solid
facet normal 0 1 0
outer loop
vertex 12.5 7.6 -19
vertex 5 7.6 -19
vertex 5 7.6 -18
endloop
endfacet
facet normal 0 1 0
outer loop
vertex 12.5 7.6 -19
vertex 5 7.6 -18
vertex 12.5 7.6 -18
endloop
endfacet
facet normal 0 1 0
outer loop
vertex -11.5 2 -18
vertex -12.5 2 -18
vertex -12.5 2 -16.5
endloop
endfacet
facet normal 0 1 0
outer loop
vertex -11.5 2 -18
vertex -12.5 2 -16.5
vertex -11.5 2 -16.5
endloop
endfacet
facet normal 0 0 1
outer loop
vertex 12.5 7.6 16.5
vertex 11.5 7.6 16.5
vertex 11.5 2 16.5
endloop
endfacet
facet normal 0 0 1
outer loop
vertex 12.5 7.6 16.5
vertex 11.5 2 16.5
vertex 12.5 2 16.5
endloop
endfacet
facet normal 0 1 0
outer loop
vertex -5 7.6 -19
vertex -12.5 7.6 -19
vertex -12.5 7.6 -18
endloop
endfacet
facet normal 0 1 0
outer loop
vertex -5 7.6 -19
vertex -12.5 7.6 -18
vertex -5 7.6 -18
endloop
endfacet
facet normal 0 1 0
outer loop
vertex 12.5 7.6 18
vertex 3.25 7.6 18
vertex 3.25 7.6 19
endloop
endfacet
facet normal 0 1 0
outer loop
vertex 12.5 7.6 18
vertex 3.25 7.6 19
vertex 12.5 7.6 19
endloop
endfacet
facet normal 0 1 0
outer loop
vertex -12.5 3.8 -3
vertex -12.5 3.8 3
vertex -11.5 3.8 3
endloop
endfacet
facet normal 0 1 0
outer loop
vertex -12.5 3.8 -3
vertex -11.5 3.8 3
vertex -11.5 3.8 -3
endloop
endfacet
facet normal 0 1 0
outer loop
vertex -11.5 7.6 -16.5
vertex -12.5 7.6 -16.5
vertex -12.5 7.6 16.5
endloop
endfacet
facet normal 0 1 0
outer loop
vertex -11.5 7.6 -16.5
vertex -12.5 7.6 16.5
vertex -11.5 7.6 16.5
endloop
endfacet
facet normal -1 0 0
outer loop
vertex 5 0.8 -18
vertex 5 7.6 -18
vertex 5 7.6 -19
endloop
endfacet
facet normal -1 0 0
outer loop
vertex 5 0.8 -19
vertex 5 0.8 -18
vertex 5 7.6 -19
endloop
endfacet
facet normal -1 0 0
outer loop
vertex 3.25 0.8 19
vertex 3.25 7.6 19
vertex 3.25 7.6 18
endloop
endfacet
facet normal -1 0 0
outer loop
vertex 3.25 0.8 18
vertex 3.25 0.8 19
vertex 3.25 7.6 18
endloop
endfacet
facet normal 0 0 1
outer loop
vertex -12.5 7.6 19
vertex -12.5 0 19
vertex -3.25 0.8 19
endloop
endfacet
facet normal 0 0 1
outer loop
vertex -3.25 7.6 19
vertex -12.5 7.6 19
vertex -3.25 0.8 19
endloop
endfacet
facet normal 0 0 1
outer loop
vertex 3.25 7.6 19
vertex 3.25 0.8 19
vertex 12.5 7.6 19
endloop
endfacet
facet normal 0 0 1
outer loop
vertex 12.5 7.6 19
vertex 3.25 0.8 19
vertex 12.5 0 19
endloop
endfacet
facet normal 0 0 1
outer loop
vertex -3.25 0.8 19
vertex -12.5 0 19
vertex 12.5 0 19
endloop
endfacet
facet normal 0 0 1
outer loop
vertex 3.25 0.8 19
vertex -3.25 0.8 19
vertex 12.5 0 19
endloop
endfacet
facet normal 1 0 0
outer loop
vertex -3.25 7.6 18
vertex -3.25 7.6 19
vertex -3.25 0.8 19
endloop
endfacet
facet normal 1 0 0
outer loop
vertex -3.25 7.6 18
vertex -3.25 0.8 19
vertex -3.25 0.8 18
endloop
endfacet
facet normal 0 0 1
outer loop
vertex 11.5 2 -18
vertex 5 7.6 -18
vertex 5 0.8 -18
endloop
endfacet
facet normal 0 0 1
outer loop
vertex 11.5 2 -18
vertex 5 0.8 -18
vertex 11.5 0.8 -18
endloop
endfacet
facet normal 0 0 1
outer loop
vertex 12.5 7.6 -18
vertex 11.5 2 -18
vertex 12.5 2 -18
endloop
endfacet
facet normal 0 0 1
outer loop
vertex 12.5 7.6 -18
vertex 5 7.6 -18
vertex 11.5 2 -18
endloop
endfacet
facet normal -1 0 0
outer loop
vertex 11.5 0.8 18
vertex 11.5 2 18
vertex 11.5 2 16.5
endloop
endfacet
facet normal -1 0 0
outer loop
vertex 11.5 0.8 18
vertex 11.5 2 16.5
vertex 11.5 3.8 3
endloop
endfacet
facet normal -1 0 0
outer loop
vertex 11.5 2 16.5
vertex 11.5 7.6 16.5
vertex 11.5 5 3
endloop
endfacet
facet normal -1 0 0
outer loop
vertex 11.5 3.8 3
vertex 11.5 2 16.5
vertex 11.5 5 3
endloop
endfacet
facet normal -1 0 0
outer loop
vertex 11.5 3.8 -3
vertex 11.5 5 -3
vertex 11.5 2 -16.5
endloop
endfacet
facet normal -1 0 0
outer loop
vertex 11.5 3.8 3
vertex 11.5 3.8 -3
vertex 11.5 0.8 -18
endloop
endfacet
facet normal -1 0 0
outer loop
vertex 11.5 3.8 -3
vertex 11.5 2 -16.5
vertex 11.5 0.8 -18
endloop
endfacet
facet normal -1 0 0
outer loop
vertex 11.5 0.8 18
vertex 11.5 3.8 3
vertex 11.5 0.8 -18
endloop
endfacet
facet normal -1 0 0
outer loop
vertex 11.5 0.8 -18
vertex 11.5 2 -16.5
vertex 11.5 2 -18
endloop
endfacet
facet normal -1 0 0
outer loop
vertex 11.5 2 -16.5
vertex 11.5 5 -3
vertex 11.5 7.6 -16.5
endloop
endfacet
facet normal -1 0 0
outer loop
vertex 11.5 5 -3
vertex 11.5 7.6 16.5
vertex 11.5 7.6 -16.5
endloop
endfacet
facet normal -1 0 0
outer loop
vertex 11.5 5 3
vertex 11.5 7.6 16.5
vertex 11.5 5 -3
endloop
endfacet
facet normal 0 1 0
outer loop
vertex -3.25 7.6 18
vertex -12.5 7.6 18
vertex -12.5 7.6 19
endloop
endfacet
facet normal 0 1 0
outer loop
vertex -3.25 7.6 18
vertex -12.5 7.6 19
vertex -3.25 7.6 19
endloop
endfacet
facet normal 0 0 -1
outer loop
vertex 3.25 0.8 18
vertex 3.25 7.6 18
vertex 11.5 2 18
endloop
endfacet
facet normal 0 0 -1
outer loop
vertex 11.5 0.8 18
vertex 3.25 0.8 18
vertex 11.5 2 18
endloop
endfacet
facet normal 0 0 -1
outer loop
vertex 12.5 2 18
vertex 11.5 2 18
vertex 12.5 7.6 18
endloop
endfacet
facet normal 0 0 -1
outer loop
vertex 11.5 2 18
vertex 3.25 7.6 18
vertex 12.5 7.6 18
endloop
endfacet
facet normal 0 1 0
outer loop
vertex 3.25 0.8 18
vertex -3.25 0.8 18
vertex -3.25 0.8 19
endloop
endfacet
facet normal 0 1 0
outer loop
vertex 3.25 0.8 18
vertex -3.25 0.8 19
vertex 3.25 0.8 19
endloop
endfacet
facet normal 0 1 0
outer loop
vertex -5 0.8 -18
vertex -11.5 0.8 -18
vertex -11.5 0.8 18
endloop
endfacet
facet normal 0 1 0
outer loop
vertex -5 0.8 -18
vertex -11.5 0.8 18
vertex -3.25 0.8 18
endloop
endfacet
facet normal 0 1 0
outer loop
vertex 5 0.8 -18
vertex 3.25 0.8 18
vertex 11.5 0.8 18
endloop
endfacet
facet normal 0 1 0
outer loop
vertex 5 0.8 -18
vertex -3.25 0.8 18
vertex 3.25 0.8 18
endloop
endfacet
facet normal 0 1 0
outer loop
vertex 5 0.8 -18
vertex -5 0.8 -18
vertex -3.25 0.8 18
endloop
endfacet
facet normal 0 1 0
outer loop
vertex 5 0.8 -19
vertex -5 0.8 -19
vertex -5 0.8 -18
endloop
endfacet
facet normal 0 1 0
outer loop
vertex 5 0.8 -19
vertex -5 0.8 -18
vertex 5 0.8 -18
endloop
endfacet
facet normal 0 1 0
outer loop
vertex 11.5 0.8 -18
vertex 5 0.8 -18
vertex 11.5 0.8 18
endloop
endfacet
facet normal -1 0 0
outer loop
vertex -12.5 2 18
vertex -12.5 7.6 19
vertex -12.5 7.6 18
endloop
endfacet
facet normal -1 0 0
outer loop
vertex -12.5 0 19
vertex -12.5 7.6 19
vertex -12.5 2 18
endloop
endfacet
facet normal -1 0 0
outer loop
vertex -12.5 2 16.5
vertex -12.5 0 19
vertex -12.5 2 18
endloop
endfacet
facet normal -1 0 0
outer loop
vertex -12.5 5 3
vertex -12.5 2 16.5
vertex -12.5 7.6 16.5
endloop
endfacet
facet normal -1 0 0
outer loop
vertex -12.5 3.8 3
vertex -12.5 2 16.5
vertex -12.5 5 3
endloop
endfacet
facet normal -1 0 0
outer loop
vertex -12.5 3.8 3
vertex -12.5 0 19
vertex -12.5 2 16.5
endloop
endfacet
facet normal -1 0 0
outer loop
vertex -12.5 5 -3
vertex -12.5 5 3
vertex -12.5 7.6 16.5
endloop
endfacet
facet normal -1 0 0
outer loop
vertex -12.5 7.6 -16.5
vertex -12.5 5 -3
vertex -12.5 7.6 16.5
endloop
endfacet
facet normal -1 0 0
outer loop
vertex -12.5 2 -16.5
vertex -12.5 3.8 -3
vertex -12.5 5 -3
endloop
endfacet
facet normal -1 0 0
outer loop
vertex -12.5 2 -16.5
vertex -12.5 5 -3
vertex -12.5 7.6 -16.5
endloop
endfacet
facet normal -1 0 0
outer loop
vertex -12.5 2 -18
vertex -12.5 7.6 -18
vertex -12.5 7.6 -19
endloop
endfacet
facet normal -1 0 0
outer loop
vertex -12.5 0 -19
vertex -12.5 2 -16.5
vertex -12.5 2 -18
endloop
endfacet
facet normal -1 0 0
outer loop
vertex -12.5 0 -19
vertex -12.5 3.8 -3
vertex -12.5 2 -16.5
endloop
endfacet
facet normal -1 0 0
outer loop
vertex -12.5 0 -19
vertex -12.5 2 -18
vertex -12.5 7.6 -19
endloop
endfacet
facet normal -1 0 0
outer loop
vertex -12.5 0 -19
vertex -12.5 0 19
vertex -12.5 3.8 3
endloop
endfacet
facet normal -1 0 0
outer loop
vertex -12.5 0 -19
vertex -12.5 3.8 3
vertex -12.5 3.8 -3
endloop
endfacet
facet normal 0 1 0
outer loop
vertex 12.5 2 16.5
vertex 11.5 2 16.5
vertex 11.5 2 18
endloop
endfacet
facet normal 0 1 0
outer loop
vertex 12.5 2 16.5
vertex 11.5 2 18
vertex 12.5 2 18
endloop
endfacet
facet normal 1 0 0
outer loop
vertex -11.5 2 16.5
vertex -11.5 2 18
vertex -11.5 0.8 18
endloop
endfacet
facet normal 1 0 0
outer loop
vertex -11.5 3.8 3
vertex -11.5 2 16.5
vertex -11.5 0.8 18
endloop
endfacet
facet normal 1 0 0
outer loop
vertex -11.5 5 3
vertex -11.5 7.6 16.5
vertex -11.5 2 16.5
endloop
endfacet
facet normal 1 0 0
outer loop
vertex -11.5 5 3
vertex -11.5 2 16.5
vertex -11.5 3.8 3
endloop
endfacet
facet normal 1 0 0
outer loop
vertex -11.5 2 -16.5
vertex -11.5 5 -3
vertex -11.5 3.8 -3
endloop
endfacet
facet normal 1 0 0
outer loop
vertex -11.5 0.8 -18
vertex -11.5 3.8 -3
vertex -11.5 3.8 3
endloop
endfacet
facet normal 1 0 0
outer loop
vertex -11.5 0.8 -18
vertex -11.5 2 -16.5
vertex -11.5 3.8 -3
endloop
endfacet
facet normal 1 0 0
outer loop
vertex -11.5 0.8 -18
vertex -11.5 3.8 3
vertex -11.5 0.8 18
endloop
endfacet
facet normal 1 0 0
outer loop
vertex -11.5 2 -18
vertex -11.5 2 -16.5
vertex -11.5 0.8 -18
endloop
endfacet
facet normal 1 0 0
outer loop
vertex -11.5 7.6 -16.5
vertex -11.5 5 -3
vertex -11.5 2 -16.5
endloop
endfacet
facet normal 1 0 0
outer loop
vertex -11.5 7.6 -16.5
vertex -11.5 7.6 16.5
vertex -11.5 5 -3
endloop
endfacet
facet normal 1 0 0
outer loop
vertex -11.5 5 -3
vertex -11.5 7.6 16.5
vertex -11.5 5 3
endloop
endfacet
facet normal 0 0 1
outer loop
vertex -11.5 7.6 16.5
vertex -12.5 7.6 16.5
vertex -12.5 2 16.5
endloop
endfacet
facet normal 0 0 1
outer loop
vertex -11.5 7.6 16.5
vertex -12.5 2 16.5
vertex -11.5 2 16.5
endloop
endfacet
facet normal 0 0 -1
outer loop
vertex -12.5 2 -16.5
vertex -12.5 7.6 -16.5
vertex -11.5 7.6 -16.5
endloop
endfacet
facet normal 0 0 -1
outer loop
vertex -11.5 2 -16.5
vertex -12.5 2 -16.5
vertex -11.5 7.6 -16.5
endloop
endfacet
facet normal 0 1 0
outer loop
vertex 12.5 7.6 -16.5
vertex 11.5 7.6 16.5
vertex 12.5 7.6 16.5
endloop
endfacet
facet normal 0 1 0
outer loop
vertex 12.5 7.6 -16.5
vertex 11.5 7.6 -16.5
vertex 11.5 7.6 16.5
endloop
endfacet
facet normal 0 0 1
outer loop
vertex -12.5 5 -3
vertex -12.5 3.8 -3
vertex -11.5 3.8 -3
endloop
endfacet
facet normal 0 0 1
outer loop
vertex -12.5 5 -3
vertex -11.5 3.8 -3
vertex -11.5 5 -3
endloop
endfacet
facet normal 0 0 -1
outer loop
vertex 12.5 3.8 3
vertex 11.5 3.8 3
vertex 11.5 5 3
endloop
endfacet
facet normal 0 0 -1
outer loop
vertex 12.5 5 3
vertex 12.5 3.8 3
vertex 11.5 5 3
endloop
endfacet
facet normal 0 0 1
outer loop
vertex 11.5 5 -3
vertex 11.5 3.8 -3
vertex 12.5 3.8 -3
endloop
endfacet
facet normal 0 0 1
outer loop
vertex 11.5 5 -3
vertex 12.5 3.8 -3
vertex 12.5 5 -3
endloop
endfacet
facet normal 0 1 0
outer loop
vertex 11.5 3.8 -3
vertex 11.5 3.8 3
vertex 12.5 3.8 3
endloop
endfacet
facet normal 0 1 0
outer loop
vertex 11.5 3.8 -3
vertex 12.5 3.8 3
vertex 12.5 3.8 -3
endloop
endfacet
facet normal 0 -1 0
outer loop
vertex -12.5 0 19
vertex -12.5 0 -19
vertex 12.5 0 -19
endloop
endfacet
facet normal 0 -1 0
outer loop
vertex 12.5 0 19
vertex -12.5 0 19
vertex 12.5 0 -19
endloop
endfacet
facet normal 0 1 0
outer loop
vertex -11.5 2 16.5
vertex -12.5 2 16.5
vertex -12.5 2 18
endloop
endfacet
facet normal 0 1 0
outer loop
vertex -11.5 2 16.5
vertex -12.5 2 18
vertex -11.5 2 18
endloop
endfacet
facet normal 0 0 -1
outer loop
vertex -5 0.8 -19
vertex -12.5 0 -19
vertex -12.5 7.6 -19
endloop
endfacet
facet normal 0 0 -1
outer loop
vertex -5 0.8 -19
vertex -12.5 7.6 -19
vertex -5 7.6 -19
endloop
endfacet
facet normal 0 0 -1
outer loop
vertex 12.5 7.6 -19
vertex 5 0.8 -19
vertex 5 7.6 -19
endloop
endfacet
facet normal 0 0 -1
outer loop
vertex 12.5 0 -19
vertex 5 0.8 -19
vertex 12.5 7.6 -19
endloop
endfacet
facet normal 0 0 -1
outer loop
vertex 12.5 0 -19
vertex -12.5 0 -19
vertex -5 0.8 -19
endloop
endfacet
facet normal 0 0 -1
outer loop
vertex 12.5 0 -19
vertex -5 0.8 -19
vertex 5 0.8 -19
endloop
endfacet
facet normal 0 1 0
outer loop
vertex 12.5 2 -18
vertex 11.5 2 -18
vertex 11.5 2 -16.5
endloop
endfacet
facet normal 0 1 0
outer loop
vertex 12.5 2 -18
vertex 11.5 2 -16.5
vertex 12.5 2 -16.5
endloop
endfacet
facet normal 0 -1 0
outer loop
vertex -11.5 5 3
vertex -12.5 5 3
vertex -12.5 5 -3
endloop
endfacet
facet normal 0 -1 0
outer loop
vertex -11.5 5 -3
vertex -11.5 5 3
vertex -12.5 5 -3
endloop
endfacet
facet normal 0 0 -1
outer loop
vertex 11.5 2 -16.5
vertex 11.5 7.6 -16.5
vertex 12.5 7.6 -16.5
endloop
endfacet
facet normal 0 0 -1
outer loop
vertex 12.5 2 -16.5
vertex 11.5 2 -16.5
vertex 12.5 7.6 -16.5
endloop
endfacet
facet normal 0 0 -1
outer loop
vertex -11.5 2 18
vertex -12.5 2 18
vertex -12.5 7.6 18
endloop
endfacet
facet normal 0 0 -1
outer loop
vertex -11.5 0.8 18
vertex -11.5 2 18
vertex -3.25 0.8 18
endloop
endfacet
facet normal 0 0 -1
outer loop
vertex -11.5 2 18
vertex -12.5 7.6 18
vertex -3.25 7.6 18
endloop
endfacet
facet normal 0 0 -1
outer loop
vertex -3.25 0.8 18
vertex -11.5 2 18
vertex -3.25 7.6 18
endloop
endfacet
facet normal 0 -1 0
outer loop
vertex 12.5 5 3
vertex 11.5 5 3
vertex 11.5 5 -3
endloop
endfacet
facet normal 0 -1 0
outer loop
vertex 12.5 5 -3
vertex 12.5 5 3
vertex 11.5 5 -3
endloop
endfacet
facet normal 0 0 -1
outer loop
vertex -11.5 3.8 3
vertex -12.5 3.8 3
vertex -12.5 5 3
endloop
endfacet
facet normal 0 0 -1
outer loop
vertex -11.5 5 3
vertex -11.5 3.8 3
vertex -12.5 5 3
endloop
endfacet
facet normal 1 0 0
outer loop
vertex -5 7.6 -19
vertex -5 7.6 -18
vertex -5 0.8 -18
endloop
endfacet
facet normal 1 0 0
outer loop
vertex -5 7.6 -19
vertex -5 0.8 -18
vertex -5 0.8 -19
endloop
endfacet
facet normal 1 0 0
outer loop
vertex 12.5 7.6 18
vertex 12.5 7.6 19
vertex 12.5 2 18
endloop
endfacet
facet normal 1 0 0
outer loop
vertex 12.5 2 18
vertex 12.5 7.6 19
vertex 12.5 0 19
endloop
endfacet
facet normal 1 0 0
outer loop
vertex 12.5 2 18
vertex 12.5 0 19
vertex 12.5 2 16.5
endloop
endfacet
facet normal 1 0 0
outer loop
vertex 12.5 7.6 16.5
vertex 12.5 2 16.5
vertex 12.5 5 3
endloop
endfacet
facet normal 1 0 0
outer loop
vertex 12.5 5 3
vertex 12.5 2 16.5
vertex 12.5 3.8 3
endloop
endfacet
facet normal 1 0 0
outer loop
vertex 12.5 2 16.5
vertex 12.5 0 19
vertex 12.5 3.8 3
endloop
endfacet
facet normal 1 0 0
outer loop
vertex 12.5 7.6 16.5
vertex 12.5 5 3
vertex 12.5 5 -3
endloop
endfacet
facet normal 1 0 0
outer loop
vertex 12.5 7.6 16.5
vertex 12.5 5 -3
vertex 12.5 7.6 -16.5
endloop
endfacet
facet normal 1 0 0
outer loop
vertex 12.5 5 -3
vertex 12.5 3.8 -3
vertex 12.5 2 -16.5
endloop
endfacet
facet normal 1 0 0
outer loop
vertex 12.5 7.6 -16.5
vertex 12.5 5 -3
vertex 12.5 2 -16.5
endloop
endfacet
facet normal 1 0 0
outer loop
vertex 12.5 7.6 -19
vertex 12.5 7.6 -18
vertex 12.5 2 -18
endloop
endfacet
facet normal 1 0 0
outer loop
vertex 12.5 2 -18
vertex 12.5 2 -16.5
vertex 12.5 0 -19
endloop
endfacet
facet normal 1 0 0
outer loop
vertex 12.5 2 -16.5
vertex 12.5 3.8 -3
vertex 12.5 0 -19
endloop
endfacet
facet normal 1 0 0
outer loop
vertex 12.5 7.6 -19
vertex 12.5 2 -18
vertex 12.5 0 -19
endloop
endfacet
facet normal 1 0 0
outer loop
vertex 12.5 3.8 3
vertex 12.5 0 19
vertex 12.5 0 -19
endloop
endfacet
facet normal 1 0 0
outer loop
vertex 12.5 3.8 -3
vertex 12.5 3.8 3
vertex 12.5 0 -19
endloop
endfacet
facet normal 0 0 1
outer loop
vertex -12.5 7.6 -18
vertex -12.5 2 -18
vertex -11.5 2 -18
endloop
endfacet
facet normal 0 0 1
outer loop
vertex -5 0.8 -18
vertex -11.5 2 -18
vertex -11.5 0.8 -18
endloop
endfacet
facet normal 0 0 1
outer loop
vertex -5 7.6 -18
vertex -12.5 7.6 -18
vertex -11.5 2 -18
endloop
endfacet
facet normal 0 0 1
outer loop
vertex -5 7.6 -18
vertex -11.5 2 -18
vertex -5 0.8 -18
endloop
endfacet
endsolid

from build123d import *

# Parameters (mm, degrees)
SKETCH1_W               = 25
SKETCH1_H               = 38
BOSS_EXTRUDE1_DEPTH     = 7.6
SKETCH2_W               = 23
SKETCH2_H               = 36
CUT_EXTRUDE1_DEPTH      = 6.8
SKETCH2_3_W             = 1
SKETCH2_3_H             = 1.5
CUT_EXTRUDE2_DEPTH      = 5.6
CUT_EXTRUDE3_DEPTH      = 24.97936613
CUT_EXTRUDE3_DEPTH_BACK = 24.97936613
SKETCH3_W               = 6
SKETCH3_H               = 1.2
SKETCH4_W               = 6.5
SKETCH4_H               = 1
SKETCH4_W_2             = 10
CUT_EXTRUDE4_DEPTH      = 6.8


with BuildPart() as part:
    # Sketch1 → Boss-Extrude1 (new body)
    with BuildSketch(Plane(origin=(0, 0, 0), x_dir=(1, 0, 0), z_dir=(0, 1, 0))):
        Rectangle(SKETCH1_W, SKETCH1_H)
    extrude(amount=BOSS_EXTRUDE1_DEPTH)

    # Sketch2 → Cut-Extrude1 (cut)
    with BuildSketch(Plane(origin=(0, 7.6, 0), x_dir=(1, 0, 0), z_dir=(0, 1, 0))):
        Rectangle(SKETCH2_W, SKETCH2_H)
    extrude(amount=-CUT_EXTRUDE1_DEPTH, mode=Mode.SUBTRACT)

    # Sketch2<3> → Cut-Extrude2 (cut)
    with BuildSketch(Plane(origin=(0, 7.6, 0), x_dir=(1, 0, 0), z_dir=(0, 1, 0))):
        with Locations((-12, 17.25)):
            Rectangle(SKETCH2_3_W, SKETCH2_3_H)
        with Locations((12, 17.25)):
            Rectangle(SKETCH2_3_W, SKETCH2_3_H)
        with Locations((-12, -17.25)):
            Rectangle(SKETCH2_3_W, SKETCH2_3_H)
        with Locations((12, -17.25)):
            Rectangle(SKETCH2_3_W, SKETCH2_3_H)
    extrude(amount=-CUT_EXTRUDE2_DEPTH, mode=Mode.SUBTRACT)

    # Sketch3 → Cut-Extrude3 (cut, two sides: drawn at the far end of the back side and taken through both)
    with BuildSketch(Plane(origin=(0, 0, 0), x_dir=(0, 0, -1), z_dir=(1, 0, 0)).offset(-CUT_EXTRUDE3_DEPTH_BACK)):
        with Locations((0, 4.4)):
            Rectangle(SKETCH3_W, SKETCH3_H)
    extrude(amount=CUT_EXTRUDE3_DEPTH + CUT_EXTRUDE3_DEPTH_BACK, mode=Mode.SUBTRACT)

    # Sketch4 → Cut-Extrude4 (cut)
    with BuildSketch(Plane(origin=(0, 7.6, 0), x_dir=(1, 0, 0), z_dir=(0, 1, 0))):
        with Locations((0, -18.5)):
            Rectangle(SKETCH4_W, SKETCH4_H)
        with Locations((0, 18.5)):
            Rectangle(SKETCH4_W_2, SKETCH4_H)
    extrude(amount=-CUT_EXTRUDE4_DEPTH, mode=Mode.SUBTRACT)


solid = part.part
